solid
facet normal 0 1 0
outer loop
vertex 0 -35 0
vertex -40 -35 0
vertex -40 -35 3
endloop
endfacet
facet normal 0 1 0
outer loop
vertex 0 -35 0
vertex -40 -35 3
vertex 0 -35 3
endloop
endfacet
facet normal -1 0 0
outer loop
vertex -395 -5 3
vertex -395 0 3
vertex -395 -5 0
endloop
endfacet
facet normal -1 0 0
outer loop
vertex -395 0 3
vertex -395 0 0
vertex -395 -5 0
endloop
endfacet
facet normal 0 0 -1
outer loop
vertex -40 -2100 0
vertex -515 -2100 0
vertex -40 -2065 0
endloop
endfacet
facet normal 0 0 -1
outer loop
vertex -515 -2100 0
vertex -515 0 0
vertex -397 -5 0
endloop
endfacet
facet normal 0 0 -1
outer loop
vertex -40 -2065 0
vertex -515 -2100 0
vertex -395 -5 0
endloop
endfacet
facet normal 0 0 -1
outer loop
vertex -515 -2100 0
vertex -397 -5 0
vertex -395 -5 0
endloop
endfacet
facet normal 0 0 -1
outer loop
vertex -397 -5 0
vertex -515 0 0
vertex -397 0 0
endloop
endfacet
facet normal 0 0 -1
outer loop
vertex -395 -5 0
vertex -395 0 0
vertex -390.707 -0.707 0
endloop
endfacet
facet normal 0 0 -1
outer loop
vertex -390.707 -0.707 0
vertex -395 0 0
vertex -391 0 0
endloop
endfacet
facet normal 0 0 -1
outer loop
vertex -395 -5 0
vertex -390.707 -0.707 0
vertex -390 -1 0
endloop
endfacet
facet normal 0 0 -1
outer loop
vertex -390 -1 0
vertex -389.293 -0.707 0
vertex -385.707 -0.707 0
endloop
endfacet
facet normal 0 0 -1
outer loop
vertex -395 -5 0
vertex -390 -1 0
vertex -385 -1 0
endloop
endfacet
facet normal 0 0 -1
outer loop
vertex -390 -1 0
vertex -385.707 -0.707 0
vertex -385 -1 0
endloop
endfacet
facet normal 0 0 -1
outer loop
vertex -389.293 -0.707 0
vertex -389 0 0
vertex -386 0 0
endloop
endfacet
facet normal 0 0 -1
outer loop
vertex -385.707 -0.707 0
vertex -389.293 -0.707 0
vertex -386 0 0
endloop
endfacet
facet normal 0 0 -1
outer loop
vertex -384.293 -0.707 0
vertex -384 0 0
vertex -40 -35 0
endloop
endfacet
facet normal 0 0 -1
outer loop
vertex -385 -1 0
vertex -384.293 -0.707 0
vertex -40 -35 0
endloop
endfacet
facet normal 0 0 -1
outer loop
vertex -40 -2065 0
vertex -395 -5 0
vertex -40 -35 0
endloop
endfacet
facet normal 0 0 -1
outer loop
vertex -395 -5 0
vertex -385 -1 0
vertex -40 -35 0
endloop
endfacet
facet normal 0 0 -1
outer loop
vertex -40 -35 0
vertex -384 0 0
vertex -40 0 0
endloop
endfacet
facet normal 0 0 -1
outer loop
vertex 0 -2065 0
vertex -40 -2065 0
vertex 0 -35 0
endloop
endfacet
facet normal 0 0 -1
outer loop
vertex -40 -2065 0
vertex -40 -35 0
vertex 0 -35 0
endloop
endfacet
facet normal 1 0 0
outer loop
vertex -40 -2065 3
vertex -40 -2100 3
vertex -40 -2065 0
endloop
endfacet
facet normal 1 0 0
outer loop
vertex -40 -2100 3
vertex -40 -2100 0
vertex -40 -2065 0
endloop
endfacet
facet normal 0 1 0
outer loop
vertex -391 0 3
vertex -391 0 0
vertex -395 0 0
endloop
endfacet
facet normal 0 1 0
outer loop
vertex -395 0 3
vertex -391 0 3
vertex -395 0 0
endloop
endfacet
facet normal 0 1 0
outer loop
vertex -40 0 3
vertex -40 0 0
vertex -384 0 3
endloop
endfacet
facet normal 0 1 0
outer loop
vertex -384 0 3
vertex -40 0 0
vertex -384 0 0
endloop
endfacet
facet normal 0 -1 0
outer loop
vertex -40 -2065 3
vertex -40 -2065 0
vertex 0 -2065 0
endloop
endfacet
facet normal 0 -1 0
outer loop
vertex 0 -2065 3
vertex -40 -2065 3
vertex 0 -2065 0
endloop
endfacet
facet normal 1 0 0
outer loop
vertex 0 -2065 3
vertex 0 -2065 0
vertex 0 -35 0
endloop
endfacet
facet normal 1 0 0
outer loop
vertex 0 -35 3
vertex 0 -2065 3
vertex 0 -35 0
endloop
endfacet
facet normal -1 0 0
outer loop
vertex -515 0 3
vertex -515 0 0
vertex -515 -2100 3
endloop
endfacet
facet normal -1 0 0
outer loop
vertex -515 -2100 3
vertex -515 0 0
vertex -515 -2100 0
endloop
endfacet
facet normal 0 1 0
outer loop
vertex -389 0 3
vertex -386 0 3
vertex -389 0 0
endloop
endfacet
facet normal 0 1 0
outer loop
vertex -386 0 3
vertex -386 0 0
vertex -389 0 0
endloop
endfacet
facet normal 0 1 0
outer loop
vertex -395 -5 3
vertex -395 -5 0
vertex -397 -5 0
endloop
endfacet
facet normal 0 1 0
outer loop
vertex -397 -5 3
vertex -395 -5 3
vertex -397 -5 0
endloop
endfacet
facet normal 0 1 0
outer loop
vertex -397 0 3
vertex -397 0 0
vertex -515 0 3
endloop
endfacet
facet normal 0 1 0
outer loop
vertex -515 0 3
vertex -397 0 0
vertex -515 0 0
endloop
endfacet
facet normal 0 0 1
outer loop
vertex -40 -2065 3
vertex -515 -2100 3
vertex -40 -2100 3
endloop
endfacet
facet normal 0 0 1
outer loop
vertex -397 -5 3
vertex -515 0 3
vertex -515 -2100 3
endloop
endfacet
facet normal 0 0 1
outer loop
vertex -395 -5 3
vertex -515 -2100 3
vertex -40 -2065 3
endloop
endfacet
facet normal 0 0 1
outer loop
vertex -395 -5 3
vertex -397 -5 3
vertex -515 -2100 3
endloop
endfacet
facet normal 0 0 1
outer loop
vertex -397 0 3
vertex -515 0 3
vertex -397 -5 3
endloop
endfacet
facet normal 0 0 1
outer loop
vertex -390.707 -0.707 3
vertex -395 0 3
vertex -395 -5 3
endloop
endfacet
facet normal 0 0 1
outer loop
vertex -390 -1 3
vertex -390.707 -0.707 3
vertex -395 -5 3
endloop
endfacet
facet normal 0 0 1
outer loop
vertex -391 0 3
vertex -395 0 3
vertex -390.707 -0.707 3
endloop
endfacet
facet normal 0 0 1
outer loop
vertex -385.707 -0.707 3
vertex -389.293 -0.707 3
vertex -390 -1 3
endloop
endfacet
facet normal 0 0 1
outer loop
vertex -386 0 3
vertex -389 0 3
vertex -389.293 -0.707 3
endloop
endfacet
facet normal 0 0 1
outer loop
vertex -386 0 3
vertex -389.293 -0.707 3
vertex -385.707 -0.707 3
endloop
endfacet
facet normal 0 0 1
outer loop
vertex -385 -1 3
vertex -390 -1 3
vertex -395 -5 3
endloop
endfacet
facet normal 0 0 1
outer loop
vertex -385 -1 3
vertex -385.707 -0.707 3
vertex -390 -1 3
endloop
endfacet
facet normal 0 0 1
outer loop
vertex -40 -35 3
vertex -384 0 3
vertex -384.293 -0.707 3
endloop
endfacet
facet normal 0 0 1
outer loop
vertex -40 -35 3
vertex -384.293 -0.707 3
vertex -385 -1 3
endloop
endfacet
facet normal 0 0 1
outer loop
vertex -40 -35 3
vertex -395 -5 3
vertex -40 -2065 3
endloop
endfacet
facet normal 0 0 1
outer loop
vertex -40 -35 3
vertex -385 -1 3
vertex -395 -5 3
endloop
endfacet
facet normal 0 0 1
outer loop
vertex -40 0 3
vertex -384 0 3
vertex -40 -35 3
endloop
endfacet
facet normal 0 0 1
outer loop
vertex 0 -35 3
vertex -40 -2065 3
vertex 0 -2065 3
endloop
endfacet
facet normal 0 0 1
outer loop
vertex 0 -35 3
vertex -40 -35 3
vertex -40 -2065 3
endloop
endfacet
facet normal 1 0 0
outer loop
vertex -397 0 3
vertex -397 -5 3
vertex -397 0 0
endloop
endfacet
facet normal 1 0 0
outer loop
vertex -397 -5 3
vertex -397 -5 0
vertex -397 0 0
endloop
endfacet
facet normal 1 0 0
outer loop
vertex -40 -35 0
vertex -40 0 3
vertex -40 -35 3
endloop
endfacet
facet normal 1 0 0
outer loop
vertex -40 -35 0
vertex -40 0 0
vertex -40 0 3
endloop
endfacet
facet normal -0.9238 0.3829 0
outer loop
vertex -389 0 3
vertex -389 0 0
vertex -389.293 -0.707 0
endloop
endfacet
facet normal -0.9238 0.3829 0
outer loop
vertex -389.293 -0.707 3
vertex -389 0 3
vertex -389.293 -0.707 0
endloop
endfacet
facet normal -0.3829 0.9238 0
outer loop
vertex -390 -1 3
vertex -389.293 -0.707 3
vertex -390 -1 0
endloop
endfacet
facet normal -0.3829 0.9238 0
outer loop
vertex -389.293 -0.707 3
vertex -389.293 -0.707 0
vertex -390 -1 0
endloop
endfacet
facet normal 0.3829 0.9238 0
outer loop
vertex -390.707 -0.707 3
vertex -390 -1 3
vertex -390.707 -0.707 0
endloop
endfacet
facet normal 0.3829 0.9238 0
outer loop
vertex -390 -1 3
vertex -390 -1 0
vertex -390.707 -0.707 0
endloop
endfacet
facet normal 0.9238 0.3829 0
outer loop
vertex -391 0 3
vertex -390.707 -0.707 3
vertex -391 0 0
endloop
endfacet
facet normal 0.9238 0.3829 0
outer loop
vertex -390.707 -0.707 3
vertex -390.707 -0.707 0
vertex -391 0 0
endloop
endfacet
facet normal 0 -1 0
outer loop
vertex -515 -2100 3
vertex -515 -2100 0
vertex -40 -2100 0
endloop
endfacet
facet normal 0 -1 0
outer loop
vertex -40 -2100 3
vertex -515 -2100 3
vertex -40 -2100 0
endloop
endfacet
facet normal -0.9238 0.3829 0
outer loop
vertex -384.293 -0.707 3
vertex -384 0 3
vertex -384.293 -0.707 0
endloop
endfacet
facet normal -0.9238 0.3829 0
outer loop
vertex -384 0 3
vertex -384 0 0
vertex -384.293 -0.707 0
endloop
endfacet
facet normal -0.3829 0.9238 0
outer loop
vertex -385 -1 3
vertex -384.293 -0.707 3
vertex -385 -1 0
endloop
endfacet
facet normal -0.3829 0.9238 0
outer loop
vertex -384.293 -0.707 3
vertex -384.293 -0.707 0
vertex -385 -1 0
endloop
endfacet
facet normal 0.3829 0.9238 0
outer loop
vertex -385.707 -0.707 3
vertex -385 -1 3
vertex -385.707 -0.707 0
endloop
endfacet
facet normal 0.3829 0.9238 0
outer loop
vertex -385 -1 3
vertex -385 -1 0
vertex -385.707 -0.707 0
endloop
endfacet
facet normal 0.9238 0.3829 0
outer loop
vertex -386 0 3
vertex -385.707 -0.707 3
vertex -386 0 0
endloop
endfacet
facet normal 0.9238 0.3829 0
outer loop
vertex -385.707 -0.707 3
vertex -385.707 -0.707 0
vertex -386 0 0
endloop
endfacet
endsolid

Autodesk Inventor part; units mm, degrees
ref_plane "YZ Plane" through (0, 0, 0) normal (1, 0, 0) x (0, 1, 0)
ref_plane "XZ Plane" through (0, 0, 0) normal (0, 1, 0) x (-1, 0, 0)
ref_plane "XY Plane" through (0, 0, 0) normal (0, 0, 1) x (1, 0, 0)
sketch "Sketch1" plane through (0, 0, 0) normal (0, 0, 1) x (1, 0, 0)
  line L0 (0, 0) -> (-515, 0)
  line L1 (-515, 0) -> (-515, -2100)
  line L2 (-515, -2100) -> (0, -2100)
  line L3 (0, -2100) -> (0, 0)
  line L4 (0, 0) -> (-40, 0)
  line L5 (-40, 0) -> (-40, -35)
  line L6 (-40, -35) -> (0, -35)
  line L7 (0, -35) -> (0, 0)
  line L8 (0, -2100) -> (-40, -2100)
  line L9 (-40, -2100) -> (-40, -2065)
  line L10 (-40, -2065) -> (0, -2065)
  line L11 (0, -2065) -> (0, -2100)
  line L12 (-515, 0) -> (-475, 0)
  line L13 (-475, 0) -> (-475, -35)
  line L14 (-475, -35) -> (-515, -35)
  line L15 (-515, -35) -> (-515, 0)
  line L16 (-515, -2100) -> (-475, -2100)
  line L17 (-475, -2100) -> (-475, -2065)
  line L18 (-475, -2065) -> (-515, -2065)
  line L19 (-515, -2065) -> (-515, -2100)
  line L20 (-340, -2100) -> (-240, -2100)
  line L21 (-240, -2100) -> (-240, -2065)
  line L22 (-240, -2065) -> (-340, -2065)
  line L23 (-340, -2065) -> (-340, -2100)
  line L24 (-340, 0) -> (-240, 0)
  line L25 (-240, 0) -> (-240, -35)
  line L26 (-240, -35) -> (-340, -35)
  line L27 (-340, -35) -> (-340, 0)
  point P0 (0, -35)
  point P1 (-40, 0)
  point P2 (-40, -2100)
  point P3 (0, -2065)
  point P4 (-240, 0)
  point P5 (-475, 0)
  point P6 (-515, -35)
  point P7 (-515, -2065)
  point P8 (-515, -35)
  point P9 (-515, -2065)
  dimension "d22" = 515
  dimension "d23" = 2100
  dimension "d24" = 40
  dimension "d25" = 35
  dimension "d28" = 100
  dimension "d29" = 200
extrude "Plate1" add sketch "Sketch1" along normal blind 3 contours L5 L6 L3 L10 L9 L2 L21 L22 L23 L17 L18 L1 L14 L13 L0 L27 L26 L25 | L25 L26 L27 L0 | L13 L14 L1 L0 | L2 L23 L22 L21 | L18 L17 L2 L1
sketch "Sketch5" plane through (0, 0, 0) normal (0, 0, -1) x (-1, 0, 0)
  line L0 (515, 0) -> (415, 0) construction
  line L1 (415, 0) -> (415, -2) construction
  line L2 (415, -2) -> (515, -2) construction
  line L3 (515, -2) -> (515, 0) construction
  line L4 (415, 0) -> (413.4752, -4.6556)
  arc A0 (412.5248, -4.6556) -> (413.4752, -4.6556) centre (413, -4.5) ccw
  line L5 (412.5248, -4.6556) -> (411, 0)
  line L6 (411, 0) -> (415, 0)
  line L7 (411, 0) -> (409, 0) construction
  line L8 (409, 0) -> (407, 0)
  line L9 (407, 0) -> (407, -5)
  line L10 (407, -5) -> (409, -5)
  line L11 (409, -5) -> (409, 0)
  line L12 (407, 0) -> (405, 0) construction
  line L13 (405, 0) -> (403, 0)
  line L14 (403, 0) -> (403, -5)
  line L15 (403, -5) -> (405, -5)
  line L16 (405, -5) -> (405, 0)
  line L17 (403, 0) -> (401, 0) construction
  line L18 (401, 0) -> (399, 0)
  line L19 (399, 0) -> (399, -5)
  line L20 (399, -5) -> (401, -5)
  line L21 (401, -5) -> (401, 0)
  line L22 (399, 0) -> (397, 0) construction
  line L23 (397, 0) -> (395, 0)
  line L24 (395, 0) -> (395, -5)
  line L25 (395, -5) -> (397, -5)
  line L26 (397, -5) -> (397, 0)
  line L27 (395, 0) -> (390, 0) construction
  line L28 (390, 0) -> (385, 0) construction
  circle A1 centre (390, 0) radius 1
  circle A2 centre (385, 0) radius 1
  point P0 (0, 0)
  point P1 (413, 0)
  point P2 (515, 0)
  dimension "d30" = 100
  dimension "d31" = 2
  dimension "d32" = 5
  dimension "d33" = 4
  dimension "d34" = 0.5
  dimension "d35" = 5
  dimension "d36" = 5
  dimension "d37" = 5
  dimension "d38" = 2
extrude "Cut1" cut sketch "Sketch5" against normal blind 3 contours L26 L25 L24 L23 | A1 | A2
equation "\"d33\" = 2 * d31"
equation "\"d34\" = 0.25 * d31"
equation "\"d38\" = d31"
equation "\"d39\" = Thickness"
equation "\"d2\" = Thickness"
equation "\"BendReliefWidth\" = Thickness"
equation "\"BendReliefDepth\" = 0.5 * Thickness"
equation "\"CornerReliefSize\" = 4 * Thickness"
equation "\"MinimumRemnant\" = 2 * Thickness"
equation "\"TransitionRadius\" = BendRadius"
equation "\"JacobiRadiusSize\" = BendRadius"
equation "\"GapSize\" = Thickness"
equation "\"Thickness\" = 3"
equation "\"BendRadius\" = 5"
properties part number "GnG frame 2 floor sheet 10" material "Stainless Steel"
